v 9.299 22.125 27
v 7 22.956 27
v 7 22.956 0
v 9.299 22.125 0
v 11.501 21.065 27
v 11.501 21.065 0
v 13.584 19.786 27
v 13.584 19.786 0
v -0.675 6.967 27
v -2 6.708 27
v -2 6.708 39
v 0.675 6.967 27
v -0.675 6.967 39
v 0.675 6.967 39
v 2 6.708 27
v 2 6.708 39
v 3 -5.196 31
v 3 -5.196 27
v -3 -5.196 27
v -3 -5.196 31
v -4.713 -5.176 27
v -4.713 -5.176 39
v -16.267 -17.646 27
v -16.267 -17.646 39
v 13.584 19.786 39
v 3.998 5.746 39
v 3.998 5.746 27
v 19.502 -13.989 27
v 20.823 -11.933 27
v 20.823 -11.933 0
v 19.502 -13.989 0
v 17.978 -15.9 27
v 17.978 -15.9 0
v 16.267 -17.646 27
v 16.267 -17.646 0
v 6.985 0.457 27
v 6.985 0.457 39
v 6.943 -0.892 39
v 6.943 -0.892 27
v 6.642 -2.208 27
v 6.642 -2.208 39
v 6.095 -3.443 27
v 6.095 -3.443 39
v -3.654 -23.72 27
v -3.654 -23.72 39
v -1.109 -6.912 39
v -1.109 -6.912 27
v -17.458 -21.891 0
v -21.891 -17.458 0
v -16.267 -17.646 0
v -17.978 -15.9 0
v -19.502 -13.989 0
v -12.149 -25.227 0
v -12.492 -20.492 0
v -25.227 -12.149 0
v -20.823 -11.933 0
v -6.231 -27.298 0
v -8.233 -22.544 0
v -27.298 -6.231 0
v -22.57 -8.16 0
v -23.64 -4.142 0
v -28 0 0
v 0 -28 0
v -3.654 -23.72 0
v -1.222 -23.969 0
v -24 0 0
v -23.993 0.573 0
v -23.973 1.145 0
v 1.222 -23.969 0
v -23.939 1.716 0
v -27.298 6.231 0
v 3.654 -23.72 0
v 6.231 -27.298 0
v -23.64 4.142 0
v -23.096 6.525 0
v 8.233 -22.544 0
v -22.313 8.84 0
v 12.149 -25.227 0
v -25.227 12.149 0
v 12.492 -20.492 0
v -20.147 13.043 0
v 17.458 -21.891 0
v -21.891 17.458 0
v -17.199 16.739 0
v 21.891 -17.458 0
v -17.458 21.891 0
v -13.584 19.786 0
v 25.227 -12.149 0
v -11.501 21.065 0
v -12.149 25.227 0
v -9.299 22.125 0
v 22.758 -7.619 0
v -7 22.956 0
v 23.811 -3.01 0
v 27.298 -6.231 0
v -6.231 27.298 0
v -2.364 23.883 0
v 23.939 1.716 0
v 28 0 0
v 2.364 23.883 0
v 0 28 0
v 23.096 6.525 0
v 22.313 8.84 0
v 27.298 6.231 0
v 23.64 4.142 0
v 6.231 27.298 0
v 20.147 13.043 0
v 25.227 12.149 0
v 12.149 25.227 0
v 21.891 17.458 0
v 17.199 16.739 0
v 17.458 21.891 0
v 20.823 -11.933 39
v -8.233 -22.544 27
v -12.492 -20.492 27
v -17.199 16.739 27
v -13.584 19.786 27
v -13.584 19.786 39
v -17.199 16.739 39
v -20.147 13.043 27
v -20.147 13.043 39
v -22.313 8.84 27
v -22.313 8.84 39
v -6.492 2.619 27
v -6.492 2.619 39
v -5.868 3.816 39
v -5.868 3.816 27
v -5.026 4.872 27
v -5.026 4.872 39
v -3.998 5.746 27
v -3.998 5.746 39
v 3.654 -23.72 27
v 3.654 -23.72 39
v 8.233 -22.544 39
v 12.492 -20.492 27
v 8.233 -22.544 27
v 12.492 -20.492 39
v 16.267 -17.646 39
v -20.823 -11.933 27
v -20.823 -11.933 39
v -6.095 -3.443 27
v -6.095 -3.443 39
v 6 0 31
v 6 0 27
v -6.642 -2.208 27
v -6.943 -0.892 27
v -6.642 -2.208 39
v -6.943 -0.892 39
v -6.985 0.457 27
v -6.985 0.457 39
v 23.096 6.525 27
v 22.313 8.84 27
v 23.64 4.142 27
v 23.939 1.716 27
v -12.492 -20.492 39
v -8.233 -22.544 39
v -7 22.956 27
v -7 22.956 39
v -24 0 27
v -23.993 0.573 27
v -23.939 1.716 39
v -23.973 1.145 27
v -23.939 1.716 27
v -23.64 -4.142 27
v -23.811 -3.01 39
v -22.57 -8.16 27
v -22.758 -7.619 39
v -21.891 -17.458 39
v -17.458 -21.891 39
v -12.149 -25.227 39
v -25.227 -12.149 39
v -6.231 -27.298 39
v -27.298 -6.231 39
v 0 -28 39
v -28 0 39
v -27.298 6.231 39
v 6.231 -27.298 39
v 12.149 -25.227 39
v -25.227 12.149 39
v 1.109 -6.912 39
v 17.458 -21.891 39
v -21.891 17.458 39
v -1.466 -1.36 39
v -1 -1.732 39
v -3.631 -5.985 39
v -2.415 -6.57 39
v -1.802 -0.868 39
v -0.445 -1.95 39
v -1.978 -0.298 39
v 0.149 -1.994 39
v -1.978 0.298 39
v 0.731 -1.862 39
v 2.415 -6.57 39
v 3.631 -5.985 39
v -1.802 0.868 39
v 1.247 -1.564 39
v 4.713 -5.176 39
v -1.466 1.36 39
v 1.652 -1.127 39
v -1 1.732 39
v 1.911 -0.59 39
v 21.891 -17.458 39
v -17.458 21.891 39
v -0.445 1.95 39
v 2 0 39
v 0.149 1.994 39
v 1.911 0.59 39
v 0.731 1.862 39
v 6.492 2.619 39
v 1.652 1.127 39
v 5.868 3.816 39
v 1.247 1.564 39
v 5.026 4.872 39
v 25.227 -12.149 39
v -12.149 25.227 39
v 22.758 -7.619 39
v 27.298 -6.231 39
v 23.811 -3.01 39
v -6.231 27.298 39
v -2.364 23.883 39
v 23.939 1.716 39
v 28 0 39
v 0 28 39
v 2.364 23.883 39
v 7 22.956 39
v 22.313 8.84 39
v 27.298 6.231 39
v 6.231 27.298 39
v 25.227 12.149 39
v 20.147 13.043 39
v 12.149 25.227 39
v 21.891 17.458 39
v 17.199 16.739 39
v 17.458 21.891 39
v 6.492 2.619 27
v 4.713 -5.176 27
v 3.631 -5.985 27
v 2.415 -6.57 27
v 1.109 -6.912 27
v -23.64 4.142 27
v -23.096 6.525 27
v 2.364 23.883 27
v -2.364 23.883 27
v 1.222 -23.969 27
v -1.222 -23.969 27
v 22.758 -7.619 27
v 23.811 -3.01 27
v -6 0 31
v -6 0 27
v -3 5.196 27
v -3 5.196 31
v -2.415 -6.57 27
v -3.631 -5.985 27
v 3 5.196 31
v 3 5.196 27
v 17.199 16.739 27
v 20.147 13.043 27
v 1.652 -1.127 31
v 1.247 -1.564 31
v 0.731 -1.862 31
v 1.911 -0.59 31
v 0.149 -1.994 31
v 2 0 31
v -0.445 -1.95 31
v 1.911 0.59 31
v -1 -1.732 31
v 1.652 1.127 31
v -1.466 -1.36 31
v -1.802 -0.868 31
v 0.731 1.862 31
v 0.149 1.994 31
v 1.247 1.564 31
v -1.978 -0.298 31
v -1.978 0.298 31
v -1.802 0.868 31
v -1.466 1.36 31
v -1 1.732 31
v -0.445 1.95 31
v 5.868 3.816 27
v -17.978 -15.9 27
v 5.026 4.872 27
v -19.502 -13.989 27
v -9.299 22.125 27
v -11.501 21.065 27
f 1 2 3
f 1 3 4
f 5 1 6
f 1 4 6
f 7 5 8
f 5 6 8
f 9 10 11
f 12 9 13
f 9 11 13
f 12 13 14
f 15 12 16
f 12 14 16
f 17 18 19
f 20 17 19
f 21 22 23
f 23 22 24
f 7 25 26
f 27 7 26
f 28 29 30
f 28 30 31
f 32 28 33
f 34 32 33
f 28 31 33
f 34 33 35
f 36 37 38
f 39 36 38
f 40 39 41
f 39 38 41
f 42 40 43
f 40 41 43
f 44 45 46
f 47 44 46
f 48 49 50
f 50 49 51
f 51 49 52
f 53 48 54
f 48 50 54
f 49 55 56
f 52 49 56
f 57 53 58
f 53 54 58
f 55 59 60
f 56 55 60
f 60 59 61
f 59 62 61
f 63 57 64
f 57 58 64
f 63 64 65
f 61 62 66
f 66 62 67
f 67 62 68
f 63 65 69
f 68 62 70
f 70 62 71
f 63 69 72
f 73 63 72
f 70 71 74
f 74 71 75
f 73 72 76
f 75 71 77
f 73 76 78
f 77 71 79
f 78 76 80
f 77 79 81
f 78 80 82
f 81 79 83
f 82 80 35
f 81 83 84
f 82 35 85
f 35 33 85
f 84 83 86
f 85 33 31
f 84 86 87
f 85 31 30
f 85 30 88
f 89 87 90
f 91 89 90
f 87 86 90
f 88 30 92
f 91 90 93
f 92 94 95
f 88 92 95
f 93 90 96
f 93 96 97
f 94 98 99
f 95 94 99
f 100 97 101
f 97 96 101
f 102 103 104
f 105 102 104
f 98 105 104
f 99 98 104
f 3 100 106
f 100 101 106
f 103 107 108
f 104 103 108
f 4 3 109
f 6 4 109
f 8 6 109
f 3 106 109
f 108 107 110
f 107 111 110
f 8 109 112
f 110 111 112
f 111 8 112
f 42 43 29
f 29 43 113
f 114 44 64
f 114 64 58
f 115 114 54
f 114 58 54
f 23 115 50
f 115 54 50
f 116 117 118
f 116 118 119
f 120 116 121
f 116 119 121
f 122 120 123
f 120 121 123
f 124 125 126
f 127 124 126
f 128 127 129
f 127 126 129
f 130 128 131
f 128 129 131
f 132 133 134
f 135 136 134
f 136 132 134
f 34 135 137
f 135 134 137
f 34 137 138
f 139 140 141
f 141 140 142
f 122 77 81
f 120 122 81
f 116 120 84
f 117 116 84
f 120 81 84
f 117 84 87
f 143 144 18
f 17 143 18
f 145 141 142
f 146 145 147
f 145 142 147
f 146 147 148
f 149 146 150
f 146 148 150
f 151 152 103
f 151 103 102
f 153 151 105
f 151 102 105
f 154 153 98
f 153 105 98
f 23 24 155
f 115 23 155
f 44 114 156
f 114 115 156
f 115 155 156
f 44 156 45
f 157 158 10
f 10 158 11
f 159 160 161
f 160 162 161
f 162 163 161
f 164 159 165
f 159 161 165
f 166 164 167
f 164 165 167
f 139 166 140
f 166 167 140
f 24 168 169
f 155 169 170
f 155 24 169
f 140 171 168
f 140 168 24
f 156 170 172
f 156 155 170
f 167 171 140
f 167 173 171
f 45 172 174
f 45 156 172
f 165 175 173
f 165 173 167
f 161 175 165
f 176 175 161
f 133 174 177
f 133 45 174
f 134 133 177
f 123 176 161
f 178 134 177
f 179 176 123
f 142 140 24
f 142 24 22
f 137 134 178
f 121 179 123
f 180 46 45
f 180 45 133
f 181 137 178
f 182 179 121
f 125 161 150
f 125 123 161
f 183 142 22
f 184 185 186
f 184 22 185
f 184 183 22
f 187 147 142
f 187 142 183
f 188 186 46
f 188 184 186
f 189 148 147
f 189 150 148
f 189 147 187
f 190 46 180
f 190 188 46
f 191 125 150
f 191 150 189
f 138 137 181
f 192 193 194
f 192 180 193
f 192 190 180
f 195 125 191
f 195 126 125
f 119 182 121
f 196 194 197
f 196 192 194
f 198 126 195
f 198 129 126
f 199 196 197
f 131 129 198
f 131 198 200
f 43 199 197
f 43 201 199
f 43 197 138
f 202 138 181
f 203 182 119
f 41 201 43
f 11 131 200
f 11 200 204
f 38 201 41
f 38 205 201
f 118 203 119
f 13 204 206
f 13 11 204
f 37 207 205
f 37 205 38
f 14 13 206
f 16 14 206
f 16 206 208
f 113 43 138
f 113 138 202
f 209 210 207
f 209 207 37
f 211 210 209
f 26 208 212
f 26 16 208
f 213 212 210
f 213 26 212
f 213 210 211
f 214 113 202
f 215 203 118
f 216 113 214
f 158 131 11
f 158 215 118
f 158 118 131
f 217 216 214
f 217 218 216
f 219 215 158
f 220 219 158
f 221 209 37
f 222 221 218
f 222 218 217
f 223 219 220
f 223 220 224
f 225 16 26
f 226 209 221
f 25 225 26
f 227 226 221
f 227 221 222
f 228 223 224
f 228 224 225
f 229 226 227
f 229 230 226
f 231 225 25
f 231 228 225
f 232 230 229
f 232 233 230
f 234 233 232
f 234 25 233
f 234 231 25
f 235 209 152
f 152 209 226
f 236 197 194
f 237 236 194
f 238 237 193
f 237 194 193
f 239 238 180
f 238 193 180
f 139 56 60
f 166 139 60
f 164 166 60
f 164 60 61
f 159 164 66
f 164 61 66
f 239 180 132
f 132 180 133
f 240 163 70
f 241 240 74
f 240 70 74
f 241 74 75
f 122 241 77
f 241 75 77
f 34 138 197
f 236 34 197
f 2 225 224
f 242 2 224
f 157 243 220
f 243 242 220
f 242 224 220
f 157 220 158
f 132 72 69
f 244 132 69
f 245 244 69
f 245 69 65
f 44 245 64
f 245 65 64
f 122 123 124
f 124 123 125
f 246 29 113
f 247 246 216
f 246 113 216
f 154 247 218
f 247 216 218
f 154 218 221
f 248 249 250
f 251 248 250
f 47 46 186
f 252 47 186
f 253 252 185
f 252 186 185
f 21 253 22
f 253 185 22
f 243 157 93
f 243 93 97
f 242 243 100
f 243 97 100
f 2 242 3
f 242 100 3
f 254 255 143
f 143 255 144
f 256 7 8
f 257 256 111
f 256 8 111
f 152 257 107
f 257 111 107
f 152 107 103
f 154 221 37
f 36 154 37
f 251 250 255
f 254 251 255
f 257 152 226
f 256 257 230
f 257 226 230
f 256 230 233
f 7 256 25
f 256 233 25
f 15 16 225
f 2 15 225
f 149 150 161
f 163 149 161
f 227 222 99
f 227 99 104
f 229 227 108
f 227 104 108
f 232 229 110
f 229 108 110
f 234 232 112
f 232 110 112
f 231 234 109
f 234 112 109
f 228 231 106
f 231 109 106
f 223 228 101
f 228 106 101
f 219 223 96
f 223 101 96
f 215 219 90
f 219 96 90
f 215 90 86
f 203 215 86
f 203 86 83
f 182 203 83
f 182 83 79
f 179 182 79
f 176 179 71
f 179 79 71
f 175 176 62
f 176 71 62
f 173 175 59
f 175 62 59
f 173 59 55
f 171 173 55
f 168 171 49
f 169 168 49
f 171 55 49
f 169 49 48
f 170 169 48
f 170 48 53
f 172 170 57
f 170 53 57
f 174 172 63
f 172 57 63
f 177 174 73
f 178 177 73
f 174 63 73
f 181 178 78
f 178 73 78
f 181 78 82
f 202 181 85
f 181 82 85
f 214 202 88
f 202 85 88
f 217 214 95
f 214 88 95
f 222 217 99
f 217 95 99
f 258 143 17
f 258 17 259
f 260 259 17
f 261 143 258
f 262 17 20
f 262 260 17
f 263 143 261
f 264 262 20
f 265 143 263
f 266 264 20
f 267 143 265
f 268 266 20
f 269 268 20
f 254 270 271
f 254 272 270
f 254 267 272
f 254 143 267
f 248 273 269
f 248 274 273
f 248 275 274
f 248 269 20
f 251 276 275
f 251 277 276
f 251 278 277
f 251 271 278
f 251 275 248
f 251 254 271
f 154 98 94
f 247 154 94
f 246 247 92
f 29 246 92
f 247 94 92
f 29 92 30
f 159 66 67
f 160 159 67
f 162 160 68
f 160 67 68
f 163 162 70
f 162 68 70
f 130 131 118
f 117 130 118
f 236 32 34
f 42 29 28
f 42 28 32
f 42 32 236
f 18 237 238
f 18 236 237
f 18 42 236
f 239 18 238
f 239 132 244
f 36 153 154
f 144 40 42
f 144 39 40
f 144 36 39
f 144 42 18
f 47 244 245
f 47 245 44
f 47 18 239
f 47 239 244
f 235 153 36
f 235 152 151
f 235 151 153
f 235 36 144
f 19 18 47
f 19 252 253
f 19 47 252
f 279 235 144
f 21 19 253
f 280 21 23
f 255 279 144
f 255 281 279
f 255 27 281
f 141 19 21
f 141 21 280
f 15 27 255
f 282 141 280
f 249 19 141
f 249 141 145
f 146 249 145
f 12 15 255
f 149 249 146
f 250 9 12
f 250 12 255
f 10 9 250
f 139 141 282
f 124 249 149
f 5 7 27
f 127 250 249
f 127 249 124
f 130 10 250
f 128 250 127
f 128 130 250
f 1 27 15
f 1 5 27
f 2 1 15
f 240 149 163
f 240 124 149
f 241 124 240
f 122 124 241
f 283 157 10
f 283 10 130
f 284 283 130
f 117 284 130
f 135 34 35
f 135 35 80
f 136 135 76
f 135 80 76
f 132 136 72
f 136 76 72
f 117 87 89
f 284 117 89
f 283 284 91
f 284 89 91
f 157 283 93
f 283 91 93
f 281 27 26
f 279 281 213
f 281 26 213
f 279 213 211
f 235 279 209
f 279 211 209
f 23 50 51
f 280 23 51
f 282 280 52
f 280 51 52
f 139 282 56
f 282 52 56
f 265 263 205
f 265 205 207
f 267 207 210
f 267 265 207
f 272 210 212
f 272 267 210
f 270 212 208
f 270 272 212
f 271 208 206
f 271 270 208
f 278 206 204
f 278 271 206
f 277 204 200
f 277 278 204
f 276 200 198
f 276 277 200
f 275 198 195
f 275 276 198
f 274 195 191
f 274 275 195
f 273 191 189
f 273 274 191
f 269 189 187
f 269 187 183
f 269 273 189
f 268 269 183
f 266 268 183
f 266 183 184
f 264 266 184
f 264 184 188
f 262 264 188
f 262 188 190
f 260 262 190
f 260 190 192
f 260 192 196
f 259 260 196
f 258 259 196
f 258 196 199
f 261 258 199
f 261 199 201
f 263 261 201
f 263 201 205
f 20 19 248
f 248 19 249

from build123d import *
from build123d.topology import SkipClean

# Parameters (mm, degrees)
SKETCH1_R           = 28
SKETCH1_R_2         = 2
BOSS_EXTRUDE1_DEPTH = 39
SKETCH2_R           = 24
CUT_EXTRUDE1_DEPTH  = 27
CUT_EXTRUDE2_DEPTH  = 4
CUT_EXTRUDE4_DEPTH  = 56.578772926


with BuildPart() as part:
    # Sketch1 → Boss-Extrude1 (new body)
    with BuildSketch(Plane.XY):
        Circle(SKETCH1_R)
        Circle(SKETCH1_R_2, mode=Mode.SUBTRACT)
    extrude(amount=BOSS_EXTRUDE1_DEPTH)

    # Sketch2 → Cut-Extrude1 (cut)
    with BuildSketch(Plane(origin=(0, 0, 0), x_dir=(-1, 0, 0), z_dir=(0, 0, -1))):
        Circle(SKETCH2_R)
    extrude(amount=-CUT_EXTRUDE1_DEPTH, mode=Mode.SUBTRACT)

    # Sketch3 → Cut-Extrude2 (cut)
    with BuildSketch(Plane(origin=(0, 0, 27), x_dir=(-1, 0, 0), z_dir=(0, 0, -1))):
        Polygon((6, 0), (3, 5.196152423), (-3, 5.196152423), (-6, 0), (-3, -5.196152423), (3, -5.196152423), align=None)
    extrude(amount=-CUT_EXTRUDE2_DEPTH, mode=Mode.SUBTRACT)

    # Sketch5 → Cut-Extrude4 (cut, through all)
    with SkipClean():  # the faces are left unmerged after this step: merging them gives an invalid solid
        with BuildSketch(Plane.XY.offset(39)):
            with BuildLine():
                Line((-7, 22.956480566), (-2, 6.708203932))
                ThreePointArc((-2, 6.708203932), (0, 7), (2, 6.708203932))
                Line((2, 6.708203932), (7, 22.956480566))
                ThreePointArc((7, 22.956480566), (0, 24), (-7, 22.956480566))
            make_face()
            with BuildLine():
                Line((13.583670621, 19.785951897), (3.997705422, 5.746159706))
                ThreePointArc((3.997705422, 5.746159706), (5.472820377, 4.364428613), (6.491664629, 2.618833776))
                Line((6.491664629, 2.618833776), (22.312527847, 8.840311143))
                ThreePointArc((22.312527847, 8.840311143), (18.763955579, 14.963755245), (13.583670621, 19.785951897))
            make_face()
            with BuildLine():
                Line((23.938560207, 1.716197889), (6.985057122, 0.45714002))
                ThreePointArc((6.985057122, 0.45714002), (6.824495385, -1.557646538), (6.094973386, -3.442571629))
                Line((6.094973386, -3.442571629), (20.823267132, -11.932792881))
                ThreePointArc((20.823267132, -11.932792881), (23.398269892, -5.340502415), (23.938560207, 1.716197889))
            make_face()
            with BuildLine():
                Line((16.2672257, -17.645888133), (4.712518341, -5.176115424))
                ThreePointArc((4.712518341, -5.176115424), (3.037186174, -6.306782075), (1.108642869, -6.911650381))
                Line((1.108642869, -6.911650381), (3.65366155, -23.720260481))
                ThreePointArc((3.65366155, -23.720260481), (10.413209739, -21.62325283), (16.2672257, -17.645888133))
            make_face()
            with BuildLine():
                Line((-3.65366155, -23.720260481), (-1.108642869, -6.911650381))
                ThreePointArc((-1.108642869, -6.911650381), (-3.037186174, -6.306782075), (-4.712518341, -5.176115424))
                Line((-4.712518341, -5.176115424), (-16.2672257, -17.645888133))
                ThreePointArc((-16.2672257, -17.645888133), (-10.413209739, -21.62325283), (-3.65366155, -23.720260481))
            make_face()
            with BuildLine():
                Line((-20.823267132, -11.932792881), (-6.094973386, -3.442571629))
                ThreePointArc((-6.094973386, -3.442571629), (-6.824495385, -1.557646538), (-6.985057122, 0.45714002))
                Line((-6.985057122, 0.45714002), (-23.938560207, 1.716197889))
                ThreePointArc((-23.938560207, 1.716197889), (-23.398269892, -5.340502415), (-20.823267132, -11.932792881))
            make_face()
            with BuildLine():
                Line((-22.312527847, 8.840311143), (-6.491664629, 2.618833776))
                ThreePointArc((-6.491664629, 2.618833776), (-5.472820377, 4.364428613), (-3.997705422, 5.746159706))
                Line((-3.997705422, 5.746159706), (-13.583670621, 19.785951897))
                ThreePointArc((-13.583670621, 19.785951897), (-18.763955579, 14.963755245), (-22.312527847, 8.840311143))
            make_face()
        extrude(amount=-CUT_EXTRUDE4_DEPTH, mode=Mode.SUBTRACT)


solid = part.part
